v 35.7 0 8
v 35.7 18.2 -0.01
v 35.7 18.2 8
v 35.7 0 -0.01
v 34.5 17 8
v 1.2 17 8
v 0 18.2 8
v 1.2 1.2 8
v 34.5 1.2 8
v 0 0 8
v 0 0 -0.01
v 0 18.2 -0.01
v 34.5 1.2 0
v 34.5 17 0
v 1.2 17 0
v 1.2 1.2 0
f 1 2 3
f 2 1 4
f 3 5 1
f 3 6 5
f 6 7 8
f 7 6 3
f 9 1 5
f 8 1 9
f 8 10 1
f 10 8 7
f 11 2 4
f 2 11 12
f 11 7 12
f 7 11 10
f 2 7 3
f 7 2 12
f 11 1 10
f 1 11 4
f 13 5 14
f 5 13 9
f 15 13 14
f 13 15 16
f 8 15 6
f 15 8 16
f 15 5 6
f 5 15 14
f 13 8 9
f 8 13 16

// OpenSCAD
// file: ../Base/Rotation.scad
// Fischertechnik Box Foundation
// Geometry Helpers Rotation

include <PlacementOptions.scad>

// getRotatedSpace(space, rotation=NoRotation)
// Rotates the space dependent on the specified rotation

function getRotatedSpace(space, rotation=NoRotation) = [
    (rotation == Rotate90 || rotation == Rotate270) ? space.y : space.x,
    (rotation == Rotate90 || rotation == Rotate270) ? space.x : space.y
];

// Rotates the given space around the fixed left lower corner
// space = the space the children needs as width/depth list [width,depth]
// rotation = 0 Rotate0 degrees, 1 Rotate90 degrees, 2 Rotate180 degrees, 3 Rotate270 degrees (equivalent to -90)

module RotateFix(space, rotation=NoRotation) {
    dy = (rotation == Rotate0 || rotation == Rotate270) ? 0 :
        (rotation == Rotate90) ? space.x :
        space.y;
    dx = (rotation < Rotate180) ? 0 :
        (rotation == Rotate180) ? space.x :
        space.y;
    
    translate([dx, dy, 0])
        rotate([0, 0, rotations[rotation]])
            children();
}
// file: ../Base/Alignment.scad
// Fischertechnik Box Foundation
// Geometry Helpers Alignment

include <PlacementOptions.scad>

// getAlignedX(elementWidth, spaceWidth, align=AlignRight, offset=0)
// Gets the aligned X offset of an element with the given
// width in the given space.
// elementWidth = The width of the element to positon
// spaceWidth = The space where the element should be aligned
// align = 0 AlignLeft, 1 AlignCenter, 2 AlignRight
// offset = an optional offset from the aligned position. When
// aligned left or centered, then positive values are in X direction.
// When aligned right then positive values are in negative X direction.

function getAlignedX(elementWidth, spaceWidth, align=AlignRight, offset=0) =
    (align == AlignLeft) ?
        offset :
        ((align == AlignCenter) ?
        (spaceWidth - elementWidth)/2 + offset :
        spaceWidth - offset - elementWidth);

// getAlignedY(elementDepth, spaceDepth, align=AlignTop, offset=0)
// Gets the aligned Y offset of an element with the given
// depth in the given space.
// elementDepth = The depth of the element to positon
// spaceDepth = The space where the element should be aligned
// align = 0 AlignBottom, 1 AlignCenter, 2 AlignTop
// offset = an optional offset from the aligned position. When
// aligned bottom or centered, then positive values are in Y direction.
// When aligned top then positive values are in negative Y direction.

function getAlignedY(elementDepth, spaceDepth, align=AlignTop, offset=0) =
    (align == AlignBottom) ?
        offset :
        ((align == AlignCenter) ?
        (spaceDepth - elementDepth)/2 + offset :
        spaceDepth - offset - elementDepth);
// file: ../Base/PlacementOptions.scad
// Fischertechnik Box Foundation
// Placement Options

// Alignment
NoAlign = 0;
AlignLeft = 1;
AlignBottom = 2;
AlignCenter = 3;
AlignRight = 4;
AlignTop = 5;

// Element rotation degree steps
rotations = [0, -90, -180, -270];

// Rotation
NoRotation = 0;
Rotate0 = 0;
Rotate90 = 1;
Rotate180 = 2;
Rotate270 = 3;

// Docking (seen from above)
NoDock = -1;
DockLeft = 0;
DockTop = 1;
DockRight = 2;
DockCorner = 2;
DockBottom = 3;

// Web corners
LowerLeft = 0;
UpperLeft = 1;
UpperRight = 2;
LowerRight = 3;

// Web position relative to corner
LeftOfCorner = 0;
RightOfCorner = 1;
// file: ../Base/Boxes.scad
// Fischertechnik Box Foundation
// Pre-designed Boxes

use <Constants.scad>

include <PlacementOptions.scad>

box190Width = 190;
box190Depth = 130;
box130Width = 130;
box130Depth = 95;

// Values are from an original ec3 box
topBottomDifference = 1.5;
outerHeight = 40;
baseThickness = 1.8;
innerHeight = outerHeight - baseThickness;
stackExcess = 5.7;
radius = 3.5;
wallThickness = 1.5;
tolerance = 0.2;

boxWallThickness = wallThickness;
boxBaseThickness = baseThickness;
boxWebWidth = 3.0;

// getBoxWallThickness()
// Gets the wall thickness of a Fischertechnik Box
function getBoxWallThickness() = boxWallThickness;

// getBoxUsageHeight(height = 38.2)
// Gets the usable height of a Fischertechnik box
// height = Outer height of the box from the bottom to the upper edge.
function getBoxUsageHeight(height = outerHeight) = height - baseThickness - stackExcess;

// getBoxInnerHeight()
// Gets the inner height of a Fischertechnik box, including the stack excess
function getBoxInnerHeight() = innerHeight;

// getBoxBaseThickness()
// Gets the thickness of the Fischertechnik box base.
function getBoxBaseThickness() = boxBaseThickness;

// getBoxWebWidth()
// Gets the width of a box web
function getBoxWebWidth() = boxWebWidth;

// getBox190Space()
// Gets the usable inner space of a Box 190 as an x/y-list
function getBox190Space() = [
    box190Width - 2*getBoxWallThickness() - topBottomDifference, 
    box190Depth - 2*getBoxWallThickness() - topBottomDifference ];

// RoundedCornerPlate(width, depth, height, radius)
// Creates a body plate with rounded corners for a box. Used
// also to create the complete box with the hull module.
// width = Width of the plate
// depth = depth of the plate 
// height = thickness of the plate
// radius = radius of the rounded corner
module RoundedCornerPlate(width, depth, height, radius) {
    translate([radius, radius])
    hull() {
        w = width-2*radius;
        d = depth-2*radius;
        cube([w, d, height]);
        cylinder(height, r=radius, $fn=getFragments());
        translate([w, 0])
            cylinder(height, r=radius, $fn=getFragments());
        translate([w, d])
            cylinder(height, r=radius, $fn=getFragments());
        translate([0, d])
            cylinder(height, r=radius, $fn=getFragments());
    }
}

// BoxBase(width, depth)
// Creates an empty stackable Fischertechnik compatible box
// width = Outer width of the box (190, 130, ...)
// depth = Outer depth of the box (130, 95, ...)

module BoxBase(width, depth, height=outerHeight) {    
    thinPlate = 0.01;

    innerHeight = height - baseThickness;    
    
    module Body(tolerance=tolerance) {
        hull() {
            // Bottom with tolerance to fit into the original boxes when stacked
            translate([-wallThickness+tolerance, -wallThickness+tolerance, -baseThickness])
                RoundedCornerPlate(width-topBottomDifference-2*tolerance, depth-topBottomDifference-2*tolerance, thinPlate, radius);
            
            // Top
            translate([-wallThickness-topBottomDifference/2, -wallThickness-topBottomDifference/2, innerHeight-thinPlate])
                RoundedCornerPlate(width, depth, thinPlate, radius);
         }
    }

    module Cutoff() {
        hull() {
            coWidth = width - 2*wallThickness;
            coDepth = depth - 2*wallThickness;
            
            // Bottom
            RoundedCornerPlate(coWidth-topBottomDifference, coDepth-topBottomDifference, thinPlate, radius);

            // Top
            translate([-topBottomDifference/2, -topBottomDifference/2, innerHeight+thinPlate]) 
                RoundedCornerPlate(coWidth, coDepth, thinPlate, radius);
        }
    }
    
    difference() {        
        Body();
        Cutoff();
        stackOffset = innerHeight - stackExcess;
        translate([0, 0, stackOffset + baseThickness])
            Body(tolerance=0);
    }
}

// Creates the Fischertechnik empty box 130x190 mm and places it at position 0,0
// 190x130 are the outer sizes, the inner space is slightly smaller. Use getBox190Space() to get the inner sizes.
// The box is positioned that the usable inner space is at the 0,0,0 position.

module Box190() {
    BoxBase(box190Width, box190Depth);
}

// Gets the usable inner space of a Box 130 as an x/y-list
function getBox130Space() = [
    box130Width - 2*getBoxWallThickness() - topBottomDifference, 
    box130Depth - 2*getBoxWallThickness() - topBottomDifference ];

// Creates the Fischertechnik empty box 95x130 mm and places it at position 0,0
// 190x130 are the outer sizes, the inner space is slightly smaller. Use getBox190Space() to get the inner sizes.
// The box is positioned that the usable inner space is at the 0,0,0 position.

module Box130() {
    BoxBase(box130Width, box130Depth);
}

// Creates a web at the specified box walls
// corner 0 = LowerLeft, 1 = UpperLeft, 2 = UpperRight, 3 = LowerRight
// side 0 = LeftOfCorner, 1 = RightOfCorner
// distance = Distance in mm from the corner
// boxSpace = inner width and depth of the box (default: Box 190)
// webWidth = length of the web (default is 3 mms)
// webThickness = thickness of the web (default is 1 mm)
// height = Height of the web (standard is getBoxUsageHeight())
// sink = How much of the web is sunk into the wall

module BoxWeb(
    corner, 
    side, 
    distance, 
    boxSpace=getBox190Space(), 
    webWidth=getBoxWebWidth(), 
    webThickness=1.0, 
    height=getBoxUsageHeight(),
    sink = getBoxWallThickness()/2) {
    width = (corner % 2 == 0) ? 
            (side == LeftOfCorner ? webWidth : webThickness) :
            (side == LeftOfCorner ? webThickness : webWidth);

    depth = (corner % 2 == 0) ? 
            (side == RightOfCorner ? webWidth : webThickness) :
            (side == RightOfCorner ? webThickness : webWidth);
    
    xDiff = corner == LowerLeft ? 
                (side == LeftOfCorner ? -sink : distance) :
            (corner == UpperLeft ?                
                (side == LeftOfCorner ? distance : -sink) :
            (corner == UpperRight ?
                (side == LeftOfCorner ? boxSpace.x-webWidth+sink : boxSpace.x-distance-webThickness) :
                (side == LeftOfCorner ? boxSpace.x-distance-webThickness: boxSpace.x-webWidth+sink)));

    yDiff = corner == LowerLeft ? 
                (side == RightOfCorner ? -sink : distance) :
            (corner == UpperLeft ?
                (side == RightOfCorner ? boxSpace.y-distance-webThickness : boxSpace.y-webWidth+sink) :
            (corner == UpperRight ?
                (side == RightOfCorner ? boxSpace.y-webWidth+sink : boxSpace.y-distance-webThickness) :
                (side == RightOfCorner ? distance : -sink)));
    
    translate([xDiff, yDiff, -getExcess()])
        cube([width, depth, height + 2*getExcess()]);
}
// file: ../Base/Placement.scad
// Fischertechnik Box Foundation
// Geometry Helpers Placement

use <Constants.scad>
use <Alignment.scad>
use <Rotation.scad>
use <Boxes.scad>

include <PlacementOptions.scad>

// Place(x=0, y=0, elementSpace=[0,0], alignX=AlignLeft, alignY=AlignBottom, rotation=Rotate0, boxSpace=getBox190Space())
// Places the child at the specified position
// y = Y-Position. This is a relative position when an X aligment is specified.
// x = X-Position. This is a relative position when an Y aligment is specified.
// elementSpace = space of the element to be placed [x,y]
// alignX = -1=NoAlign, 0 AlignLeft, 1 AlignCenter, 3 AlignRight (elementSpace and boxSpace required!)
// alignY = -1=NoAlign, 2 AlignBottom, 1 AlignCenter, 4 AlignTop (elementSpace and boxSpace required!)
// rotation = 0 Rotate0 0 degrees, 1 Rotate90 90 degrees, 
// 2 Rotate180 180 degrees, 3 Rotate270 270 degrees (equivalent to -90)
// boxSpace = Inner space of the box where the placement occurs [x,y] - default is Box 190x130 inner space

module Place(x=0, y=0, elementSpace=[0,0], 
  alignX=AlignLeft, alignY=AlignBottom, 
  rotation=NoRotation, boxSpace=getBox190Space()) {

    module Position(x, y, space, rotation=Rotate0) {
        translate([x, y, 0])
            RotateFix(space, rotation)
                children();
    }

    space = getRotatedSpace(elementSpace, rotation);
    alignedX = getAlignedX(space.x, boxSpace.x, alignX, x);
    alignedY = getAlignedY(space.y, boxSpace.y, alignY, y);
    Position(alignedX, alignedY, elementSpace, rotation)
        children();
}

// Center(space=getBox130Space(), elementSpace=[0,0])
// space = Space where the children is centered. For cylinder use centered=true and no elementSpace.
// elementSpace = space of the element to be centered [x,y]

module Center(space=getBox190Space(), elementSpace=[0,0]) {
    Place(elementSpace=elementSpace, boxSpace=space, alignX=AlignCenter, alignY=AlignCenter)
        children();
}

// CenterHorizontal(width=0, y=0, offset=0, space=getBox130Space())
// width = Width of the element to be placed.
// y = Y position of the element
// offset = Offset from the center position (negative will be left of the center)
// space = Space where the element is placed

module CenterHorizontal(width=0, y=0, offset=0, space=getBox190Space()) {
    Place(x=offset, y=y, elementSpace=[width, 0], boxSpace=space, alignX=AlignCenter)
        children(0);
}

// CenterVertical(depth=0, x=0, offset=0, space=getBox130Space())
// depth = Depth of the element to be placed.
// x = X position of the element
// offset = Offset from the center position (negative will be down of the center)
// space = Space where the element is placed

module CenterVertical(depth=0, x=0, offset=0, space=getBox190Space()) {
    Place(x=x, y=offset, elementSpace=[0, depth], boxSpace=space, alignY=AlignCenter)
        children(0);
}

// getIsVertical(align)
// True if the specified alignment needs a vertical orientation for a divider (AlignRight, AlignLeft)

function getIsVertical(align) = (align == AlignRight || align == AlignLeft);

// getIsHorizontal(align)
// True if the specified alignment needs a horizontal orientation for a divider (AlignTop, AlignBottom)

function getIsHorizontal(align) = (align == AlignTop || align == AlignBottom);
// file: ../Base/Constants.scad
// Fischertechnik Box Foundation
// Constants

// Constant values necessary for multiple elements

// Base constants
dividerThickness = 1.2;
excess = 0.01;
fragments = 90;
tolerance = 0.8;

// Gets the thickness of a divider 
function getDividerThickness() = dividerThickness;

// Gets the excess that is used to merge walls into each other
function getExcess() = excess;

// Gets amount of fragments of a cylinder
function getFragments() = fragments;

// Gets the inner tolerance of a frame to each side
function getTolerance() = tolerance;


// Fischertechnik specific constants
axisDiameter = 4;
axisBottomDiameter = axisDiameter + 1;
axisTolerance = 0.2;

// Gets axis diameter of Fischertechnik axis
function getAxisDiameter() = axisDiameter;

// Gets axis diameter tolerance (subtracted for element axis)
function getAxisTolerance() = axisTolerance;

// Gets the axis diameter for standing axis
function getStandAxisDiameter() = getAxisDiameter() - getAxisTolerance();

// Gets axis bottom diameter for thicker part at the bottom
function getAxisBottomDiameter() = axisBottomDiameter;

pinHeight = 2.5;

// gets the height of a connecting pin
function getPinHeight() = pinHeight;

standardEdgeDistance = 2.5;
standardWebDistance = 11.5;
standardCornerLength = 15;

// gets the standard distance to the wall of the box for dockable frames with webs
function getStandardEdgeDistance() = standardEdgeDistance;

// gets the standard distance of each web to the corner of the dockable frame
function getStandardWebDistance() = standardWebDistance;

// gets the standard length of the corner walls of a dockable frame
function getStandardCornerLength() = standardCornerLength;

tubeWallFactor = 0.8;

// gets the wall thickness of a tube.
function getTubeWallThickness() = tubeWallFactor * getDividerThickness();

smallPartsFrameHeight = 20;

// gets the frame height for docked small parts boxes.
function getSmallPartsFrameHeight() = smallPartsFrameHeight;

hubRingDiameter = 19.5;
hubRingLevelDiameter = 21;

// gets the diameter of a tube matching the inner ring of a wheel
function getHubRingDiameter() = hubRingDiameter;

// gets the diameter of a hub tube with a thicker diameter
function getHubRingLevelDiameter() = hubRingLevelDiameter;
// main file
// Fischertechnik Box Library
// Frame for one laying standard block
// 31004, 32880

use <../ModelBase/Simple.scad>

/* [Hidden] */
width = 32.5;
depth = 15;
height = 8;

// getFrameSingleLayingBlockSpace()
// Gets the space of a frame for a single laying 30 mm bulding block

function getFrameSingleLayingStandardBlockSpace(columns=1, rows=1) = getFrameOuterVolume([width, depth, height]);

// FrameSingleLayingBlock()
// Frame for a single laying 30 mm bulding block

module FrameSingleLayingStandardBlock() {
    Frame([width, depth, height]);
}

// Tests
color("lightgray")
FrameSingleLayingStandardBlock();
